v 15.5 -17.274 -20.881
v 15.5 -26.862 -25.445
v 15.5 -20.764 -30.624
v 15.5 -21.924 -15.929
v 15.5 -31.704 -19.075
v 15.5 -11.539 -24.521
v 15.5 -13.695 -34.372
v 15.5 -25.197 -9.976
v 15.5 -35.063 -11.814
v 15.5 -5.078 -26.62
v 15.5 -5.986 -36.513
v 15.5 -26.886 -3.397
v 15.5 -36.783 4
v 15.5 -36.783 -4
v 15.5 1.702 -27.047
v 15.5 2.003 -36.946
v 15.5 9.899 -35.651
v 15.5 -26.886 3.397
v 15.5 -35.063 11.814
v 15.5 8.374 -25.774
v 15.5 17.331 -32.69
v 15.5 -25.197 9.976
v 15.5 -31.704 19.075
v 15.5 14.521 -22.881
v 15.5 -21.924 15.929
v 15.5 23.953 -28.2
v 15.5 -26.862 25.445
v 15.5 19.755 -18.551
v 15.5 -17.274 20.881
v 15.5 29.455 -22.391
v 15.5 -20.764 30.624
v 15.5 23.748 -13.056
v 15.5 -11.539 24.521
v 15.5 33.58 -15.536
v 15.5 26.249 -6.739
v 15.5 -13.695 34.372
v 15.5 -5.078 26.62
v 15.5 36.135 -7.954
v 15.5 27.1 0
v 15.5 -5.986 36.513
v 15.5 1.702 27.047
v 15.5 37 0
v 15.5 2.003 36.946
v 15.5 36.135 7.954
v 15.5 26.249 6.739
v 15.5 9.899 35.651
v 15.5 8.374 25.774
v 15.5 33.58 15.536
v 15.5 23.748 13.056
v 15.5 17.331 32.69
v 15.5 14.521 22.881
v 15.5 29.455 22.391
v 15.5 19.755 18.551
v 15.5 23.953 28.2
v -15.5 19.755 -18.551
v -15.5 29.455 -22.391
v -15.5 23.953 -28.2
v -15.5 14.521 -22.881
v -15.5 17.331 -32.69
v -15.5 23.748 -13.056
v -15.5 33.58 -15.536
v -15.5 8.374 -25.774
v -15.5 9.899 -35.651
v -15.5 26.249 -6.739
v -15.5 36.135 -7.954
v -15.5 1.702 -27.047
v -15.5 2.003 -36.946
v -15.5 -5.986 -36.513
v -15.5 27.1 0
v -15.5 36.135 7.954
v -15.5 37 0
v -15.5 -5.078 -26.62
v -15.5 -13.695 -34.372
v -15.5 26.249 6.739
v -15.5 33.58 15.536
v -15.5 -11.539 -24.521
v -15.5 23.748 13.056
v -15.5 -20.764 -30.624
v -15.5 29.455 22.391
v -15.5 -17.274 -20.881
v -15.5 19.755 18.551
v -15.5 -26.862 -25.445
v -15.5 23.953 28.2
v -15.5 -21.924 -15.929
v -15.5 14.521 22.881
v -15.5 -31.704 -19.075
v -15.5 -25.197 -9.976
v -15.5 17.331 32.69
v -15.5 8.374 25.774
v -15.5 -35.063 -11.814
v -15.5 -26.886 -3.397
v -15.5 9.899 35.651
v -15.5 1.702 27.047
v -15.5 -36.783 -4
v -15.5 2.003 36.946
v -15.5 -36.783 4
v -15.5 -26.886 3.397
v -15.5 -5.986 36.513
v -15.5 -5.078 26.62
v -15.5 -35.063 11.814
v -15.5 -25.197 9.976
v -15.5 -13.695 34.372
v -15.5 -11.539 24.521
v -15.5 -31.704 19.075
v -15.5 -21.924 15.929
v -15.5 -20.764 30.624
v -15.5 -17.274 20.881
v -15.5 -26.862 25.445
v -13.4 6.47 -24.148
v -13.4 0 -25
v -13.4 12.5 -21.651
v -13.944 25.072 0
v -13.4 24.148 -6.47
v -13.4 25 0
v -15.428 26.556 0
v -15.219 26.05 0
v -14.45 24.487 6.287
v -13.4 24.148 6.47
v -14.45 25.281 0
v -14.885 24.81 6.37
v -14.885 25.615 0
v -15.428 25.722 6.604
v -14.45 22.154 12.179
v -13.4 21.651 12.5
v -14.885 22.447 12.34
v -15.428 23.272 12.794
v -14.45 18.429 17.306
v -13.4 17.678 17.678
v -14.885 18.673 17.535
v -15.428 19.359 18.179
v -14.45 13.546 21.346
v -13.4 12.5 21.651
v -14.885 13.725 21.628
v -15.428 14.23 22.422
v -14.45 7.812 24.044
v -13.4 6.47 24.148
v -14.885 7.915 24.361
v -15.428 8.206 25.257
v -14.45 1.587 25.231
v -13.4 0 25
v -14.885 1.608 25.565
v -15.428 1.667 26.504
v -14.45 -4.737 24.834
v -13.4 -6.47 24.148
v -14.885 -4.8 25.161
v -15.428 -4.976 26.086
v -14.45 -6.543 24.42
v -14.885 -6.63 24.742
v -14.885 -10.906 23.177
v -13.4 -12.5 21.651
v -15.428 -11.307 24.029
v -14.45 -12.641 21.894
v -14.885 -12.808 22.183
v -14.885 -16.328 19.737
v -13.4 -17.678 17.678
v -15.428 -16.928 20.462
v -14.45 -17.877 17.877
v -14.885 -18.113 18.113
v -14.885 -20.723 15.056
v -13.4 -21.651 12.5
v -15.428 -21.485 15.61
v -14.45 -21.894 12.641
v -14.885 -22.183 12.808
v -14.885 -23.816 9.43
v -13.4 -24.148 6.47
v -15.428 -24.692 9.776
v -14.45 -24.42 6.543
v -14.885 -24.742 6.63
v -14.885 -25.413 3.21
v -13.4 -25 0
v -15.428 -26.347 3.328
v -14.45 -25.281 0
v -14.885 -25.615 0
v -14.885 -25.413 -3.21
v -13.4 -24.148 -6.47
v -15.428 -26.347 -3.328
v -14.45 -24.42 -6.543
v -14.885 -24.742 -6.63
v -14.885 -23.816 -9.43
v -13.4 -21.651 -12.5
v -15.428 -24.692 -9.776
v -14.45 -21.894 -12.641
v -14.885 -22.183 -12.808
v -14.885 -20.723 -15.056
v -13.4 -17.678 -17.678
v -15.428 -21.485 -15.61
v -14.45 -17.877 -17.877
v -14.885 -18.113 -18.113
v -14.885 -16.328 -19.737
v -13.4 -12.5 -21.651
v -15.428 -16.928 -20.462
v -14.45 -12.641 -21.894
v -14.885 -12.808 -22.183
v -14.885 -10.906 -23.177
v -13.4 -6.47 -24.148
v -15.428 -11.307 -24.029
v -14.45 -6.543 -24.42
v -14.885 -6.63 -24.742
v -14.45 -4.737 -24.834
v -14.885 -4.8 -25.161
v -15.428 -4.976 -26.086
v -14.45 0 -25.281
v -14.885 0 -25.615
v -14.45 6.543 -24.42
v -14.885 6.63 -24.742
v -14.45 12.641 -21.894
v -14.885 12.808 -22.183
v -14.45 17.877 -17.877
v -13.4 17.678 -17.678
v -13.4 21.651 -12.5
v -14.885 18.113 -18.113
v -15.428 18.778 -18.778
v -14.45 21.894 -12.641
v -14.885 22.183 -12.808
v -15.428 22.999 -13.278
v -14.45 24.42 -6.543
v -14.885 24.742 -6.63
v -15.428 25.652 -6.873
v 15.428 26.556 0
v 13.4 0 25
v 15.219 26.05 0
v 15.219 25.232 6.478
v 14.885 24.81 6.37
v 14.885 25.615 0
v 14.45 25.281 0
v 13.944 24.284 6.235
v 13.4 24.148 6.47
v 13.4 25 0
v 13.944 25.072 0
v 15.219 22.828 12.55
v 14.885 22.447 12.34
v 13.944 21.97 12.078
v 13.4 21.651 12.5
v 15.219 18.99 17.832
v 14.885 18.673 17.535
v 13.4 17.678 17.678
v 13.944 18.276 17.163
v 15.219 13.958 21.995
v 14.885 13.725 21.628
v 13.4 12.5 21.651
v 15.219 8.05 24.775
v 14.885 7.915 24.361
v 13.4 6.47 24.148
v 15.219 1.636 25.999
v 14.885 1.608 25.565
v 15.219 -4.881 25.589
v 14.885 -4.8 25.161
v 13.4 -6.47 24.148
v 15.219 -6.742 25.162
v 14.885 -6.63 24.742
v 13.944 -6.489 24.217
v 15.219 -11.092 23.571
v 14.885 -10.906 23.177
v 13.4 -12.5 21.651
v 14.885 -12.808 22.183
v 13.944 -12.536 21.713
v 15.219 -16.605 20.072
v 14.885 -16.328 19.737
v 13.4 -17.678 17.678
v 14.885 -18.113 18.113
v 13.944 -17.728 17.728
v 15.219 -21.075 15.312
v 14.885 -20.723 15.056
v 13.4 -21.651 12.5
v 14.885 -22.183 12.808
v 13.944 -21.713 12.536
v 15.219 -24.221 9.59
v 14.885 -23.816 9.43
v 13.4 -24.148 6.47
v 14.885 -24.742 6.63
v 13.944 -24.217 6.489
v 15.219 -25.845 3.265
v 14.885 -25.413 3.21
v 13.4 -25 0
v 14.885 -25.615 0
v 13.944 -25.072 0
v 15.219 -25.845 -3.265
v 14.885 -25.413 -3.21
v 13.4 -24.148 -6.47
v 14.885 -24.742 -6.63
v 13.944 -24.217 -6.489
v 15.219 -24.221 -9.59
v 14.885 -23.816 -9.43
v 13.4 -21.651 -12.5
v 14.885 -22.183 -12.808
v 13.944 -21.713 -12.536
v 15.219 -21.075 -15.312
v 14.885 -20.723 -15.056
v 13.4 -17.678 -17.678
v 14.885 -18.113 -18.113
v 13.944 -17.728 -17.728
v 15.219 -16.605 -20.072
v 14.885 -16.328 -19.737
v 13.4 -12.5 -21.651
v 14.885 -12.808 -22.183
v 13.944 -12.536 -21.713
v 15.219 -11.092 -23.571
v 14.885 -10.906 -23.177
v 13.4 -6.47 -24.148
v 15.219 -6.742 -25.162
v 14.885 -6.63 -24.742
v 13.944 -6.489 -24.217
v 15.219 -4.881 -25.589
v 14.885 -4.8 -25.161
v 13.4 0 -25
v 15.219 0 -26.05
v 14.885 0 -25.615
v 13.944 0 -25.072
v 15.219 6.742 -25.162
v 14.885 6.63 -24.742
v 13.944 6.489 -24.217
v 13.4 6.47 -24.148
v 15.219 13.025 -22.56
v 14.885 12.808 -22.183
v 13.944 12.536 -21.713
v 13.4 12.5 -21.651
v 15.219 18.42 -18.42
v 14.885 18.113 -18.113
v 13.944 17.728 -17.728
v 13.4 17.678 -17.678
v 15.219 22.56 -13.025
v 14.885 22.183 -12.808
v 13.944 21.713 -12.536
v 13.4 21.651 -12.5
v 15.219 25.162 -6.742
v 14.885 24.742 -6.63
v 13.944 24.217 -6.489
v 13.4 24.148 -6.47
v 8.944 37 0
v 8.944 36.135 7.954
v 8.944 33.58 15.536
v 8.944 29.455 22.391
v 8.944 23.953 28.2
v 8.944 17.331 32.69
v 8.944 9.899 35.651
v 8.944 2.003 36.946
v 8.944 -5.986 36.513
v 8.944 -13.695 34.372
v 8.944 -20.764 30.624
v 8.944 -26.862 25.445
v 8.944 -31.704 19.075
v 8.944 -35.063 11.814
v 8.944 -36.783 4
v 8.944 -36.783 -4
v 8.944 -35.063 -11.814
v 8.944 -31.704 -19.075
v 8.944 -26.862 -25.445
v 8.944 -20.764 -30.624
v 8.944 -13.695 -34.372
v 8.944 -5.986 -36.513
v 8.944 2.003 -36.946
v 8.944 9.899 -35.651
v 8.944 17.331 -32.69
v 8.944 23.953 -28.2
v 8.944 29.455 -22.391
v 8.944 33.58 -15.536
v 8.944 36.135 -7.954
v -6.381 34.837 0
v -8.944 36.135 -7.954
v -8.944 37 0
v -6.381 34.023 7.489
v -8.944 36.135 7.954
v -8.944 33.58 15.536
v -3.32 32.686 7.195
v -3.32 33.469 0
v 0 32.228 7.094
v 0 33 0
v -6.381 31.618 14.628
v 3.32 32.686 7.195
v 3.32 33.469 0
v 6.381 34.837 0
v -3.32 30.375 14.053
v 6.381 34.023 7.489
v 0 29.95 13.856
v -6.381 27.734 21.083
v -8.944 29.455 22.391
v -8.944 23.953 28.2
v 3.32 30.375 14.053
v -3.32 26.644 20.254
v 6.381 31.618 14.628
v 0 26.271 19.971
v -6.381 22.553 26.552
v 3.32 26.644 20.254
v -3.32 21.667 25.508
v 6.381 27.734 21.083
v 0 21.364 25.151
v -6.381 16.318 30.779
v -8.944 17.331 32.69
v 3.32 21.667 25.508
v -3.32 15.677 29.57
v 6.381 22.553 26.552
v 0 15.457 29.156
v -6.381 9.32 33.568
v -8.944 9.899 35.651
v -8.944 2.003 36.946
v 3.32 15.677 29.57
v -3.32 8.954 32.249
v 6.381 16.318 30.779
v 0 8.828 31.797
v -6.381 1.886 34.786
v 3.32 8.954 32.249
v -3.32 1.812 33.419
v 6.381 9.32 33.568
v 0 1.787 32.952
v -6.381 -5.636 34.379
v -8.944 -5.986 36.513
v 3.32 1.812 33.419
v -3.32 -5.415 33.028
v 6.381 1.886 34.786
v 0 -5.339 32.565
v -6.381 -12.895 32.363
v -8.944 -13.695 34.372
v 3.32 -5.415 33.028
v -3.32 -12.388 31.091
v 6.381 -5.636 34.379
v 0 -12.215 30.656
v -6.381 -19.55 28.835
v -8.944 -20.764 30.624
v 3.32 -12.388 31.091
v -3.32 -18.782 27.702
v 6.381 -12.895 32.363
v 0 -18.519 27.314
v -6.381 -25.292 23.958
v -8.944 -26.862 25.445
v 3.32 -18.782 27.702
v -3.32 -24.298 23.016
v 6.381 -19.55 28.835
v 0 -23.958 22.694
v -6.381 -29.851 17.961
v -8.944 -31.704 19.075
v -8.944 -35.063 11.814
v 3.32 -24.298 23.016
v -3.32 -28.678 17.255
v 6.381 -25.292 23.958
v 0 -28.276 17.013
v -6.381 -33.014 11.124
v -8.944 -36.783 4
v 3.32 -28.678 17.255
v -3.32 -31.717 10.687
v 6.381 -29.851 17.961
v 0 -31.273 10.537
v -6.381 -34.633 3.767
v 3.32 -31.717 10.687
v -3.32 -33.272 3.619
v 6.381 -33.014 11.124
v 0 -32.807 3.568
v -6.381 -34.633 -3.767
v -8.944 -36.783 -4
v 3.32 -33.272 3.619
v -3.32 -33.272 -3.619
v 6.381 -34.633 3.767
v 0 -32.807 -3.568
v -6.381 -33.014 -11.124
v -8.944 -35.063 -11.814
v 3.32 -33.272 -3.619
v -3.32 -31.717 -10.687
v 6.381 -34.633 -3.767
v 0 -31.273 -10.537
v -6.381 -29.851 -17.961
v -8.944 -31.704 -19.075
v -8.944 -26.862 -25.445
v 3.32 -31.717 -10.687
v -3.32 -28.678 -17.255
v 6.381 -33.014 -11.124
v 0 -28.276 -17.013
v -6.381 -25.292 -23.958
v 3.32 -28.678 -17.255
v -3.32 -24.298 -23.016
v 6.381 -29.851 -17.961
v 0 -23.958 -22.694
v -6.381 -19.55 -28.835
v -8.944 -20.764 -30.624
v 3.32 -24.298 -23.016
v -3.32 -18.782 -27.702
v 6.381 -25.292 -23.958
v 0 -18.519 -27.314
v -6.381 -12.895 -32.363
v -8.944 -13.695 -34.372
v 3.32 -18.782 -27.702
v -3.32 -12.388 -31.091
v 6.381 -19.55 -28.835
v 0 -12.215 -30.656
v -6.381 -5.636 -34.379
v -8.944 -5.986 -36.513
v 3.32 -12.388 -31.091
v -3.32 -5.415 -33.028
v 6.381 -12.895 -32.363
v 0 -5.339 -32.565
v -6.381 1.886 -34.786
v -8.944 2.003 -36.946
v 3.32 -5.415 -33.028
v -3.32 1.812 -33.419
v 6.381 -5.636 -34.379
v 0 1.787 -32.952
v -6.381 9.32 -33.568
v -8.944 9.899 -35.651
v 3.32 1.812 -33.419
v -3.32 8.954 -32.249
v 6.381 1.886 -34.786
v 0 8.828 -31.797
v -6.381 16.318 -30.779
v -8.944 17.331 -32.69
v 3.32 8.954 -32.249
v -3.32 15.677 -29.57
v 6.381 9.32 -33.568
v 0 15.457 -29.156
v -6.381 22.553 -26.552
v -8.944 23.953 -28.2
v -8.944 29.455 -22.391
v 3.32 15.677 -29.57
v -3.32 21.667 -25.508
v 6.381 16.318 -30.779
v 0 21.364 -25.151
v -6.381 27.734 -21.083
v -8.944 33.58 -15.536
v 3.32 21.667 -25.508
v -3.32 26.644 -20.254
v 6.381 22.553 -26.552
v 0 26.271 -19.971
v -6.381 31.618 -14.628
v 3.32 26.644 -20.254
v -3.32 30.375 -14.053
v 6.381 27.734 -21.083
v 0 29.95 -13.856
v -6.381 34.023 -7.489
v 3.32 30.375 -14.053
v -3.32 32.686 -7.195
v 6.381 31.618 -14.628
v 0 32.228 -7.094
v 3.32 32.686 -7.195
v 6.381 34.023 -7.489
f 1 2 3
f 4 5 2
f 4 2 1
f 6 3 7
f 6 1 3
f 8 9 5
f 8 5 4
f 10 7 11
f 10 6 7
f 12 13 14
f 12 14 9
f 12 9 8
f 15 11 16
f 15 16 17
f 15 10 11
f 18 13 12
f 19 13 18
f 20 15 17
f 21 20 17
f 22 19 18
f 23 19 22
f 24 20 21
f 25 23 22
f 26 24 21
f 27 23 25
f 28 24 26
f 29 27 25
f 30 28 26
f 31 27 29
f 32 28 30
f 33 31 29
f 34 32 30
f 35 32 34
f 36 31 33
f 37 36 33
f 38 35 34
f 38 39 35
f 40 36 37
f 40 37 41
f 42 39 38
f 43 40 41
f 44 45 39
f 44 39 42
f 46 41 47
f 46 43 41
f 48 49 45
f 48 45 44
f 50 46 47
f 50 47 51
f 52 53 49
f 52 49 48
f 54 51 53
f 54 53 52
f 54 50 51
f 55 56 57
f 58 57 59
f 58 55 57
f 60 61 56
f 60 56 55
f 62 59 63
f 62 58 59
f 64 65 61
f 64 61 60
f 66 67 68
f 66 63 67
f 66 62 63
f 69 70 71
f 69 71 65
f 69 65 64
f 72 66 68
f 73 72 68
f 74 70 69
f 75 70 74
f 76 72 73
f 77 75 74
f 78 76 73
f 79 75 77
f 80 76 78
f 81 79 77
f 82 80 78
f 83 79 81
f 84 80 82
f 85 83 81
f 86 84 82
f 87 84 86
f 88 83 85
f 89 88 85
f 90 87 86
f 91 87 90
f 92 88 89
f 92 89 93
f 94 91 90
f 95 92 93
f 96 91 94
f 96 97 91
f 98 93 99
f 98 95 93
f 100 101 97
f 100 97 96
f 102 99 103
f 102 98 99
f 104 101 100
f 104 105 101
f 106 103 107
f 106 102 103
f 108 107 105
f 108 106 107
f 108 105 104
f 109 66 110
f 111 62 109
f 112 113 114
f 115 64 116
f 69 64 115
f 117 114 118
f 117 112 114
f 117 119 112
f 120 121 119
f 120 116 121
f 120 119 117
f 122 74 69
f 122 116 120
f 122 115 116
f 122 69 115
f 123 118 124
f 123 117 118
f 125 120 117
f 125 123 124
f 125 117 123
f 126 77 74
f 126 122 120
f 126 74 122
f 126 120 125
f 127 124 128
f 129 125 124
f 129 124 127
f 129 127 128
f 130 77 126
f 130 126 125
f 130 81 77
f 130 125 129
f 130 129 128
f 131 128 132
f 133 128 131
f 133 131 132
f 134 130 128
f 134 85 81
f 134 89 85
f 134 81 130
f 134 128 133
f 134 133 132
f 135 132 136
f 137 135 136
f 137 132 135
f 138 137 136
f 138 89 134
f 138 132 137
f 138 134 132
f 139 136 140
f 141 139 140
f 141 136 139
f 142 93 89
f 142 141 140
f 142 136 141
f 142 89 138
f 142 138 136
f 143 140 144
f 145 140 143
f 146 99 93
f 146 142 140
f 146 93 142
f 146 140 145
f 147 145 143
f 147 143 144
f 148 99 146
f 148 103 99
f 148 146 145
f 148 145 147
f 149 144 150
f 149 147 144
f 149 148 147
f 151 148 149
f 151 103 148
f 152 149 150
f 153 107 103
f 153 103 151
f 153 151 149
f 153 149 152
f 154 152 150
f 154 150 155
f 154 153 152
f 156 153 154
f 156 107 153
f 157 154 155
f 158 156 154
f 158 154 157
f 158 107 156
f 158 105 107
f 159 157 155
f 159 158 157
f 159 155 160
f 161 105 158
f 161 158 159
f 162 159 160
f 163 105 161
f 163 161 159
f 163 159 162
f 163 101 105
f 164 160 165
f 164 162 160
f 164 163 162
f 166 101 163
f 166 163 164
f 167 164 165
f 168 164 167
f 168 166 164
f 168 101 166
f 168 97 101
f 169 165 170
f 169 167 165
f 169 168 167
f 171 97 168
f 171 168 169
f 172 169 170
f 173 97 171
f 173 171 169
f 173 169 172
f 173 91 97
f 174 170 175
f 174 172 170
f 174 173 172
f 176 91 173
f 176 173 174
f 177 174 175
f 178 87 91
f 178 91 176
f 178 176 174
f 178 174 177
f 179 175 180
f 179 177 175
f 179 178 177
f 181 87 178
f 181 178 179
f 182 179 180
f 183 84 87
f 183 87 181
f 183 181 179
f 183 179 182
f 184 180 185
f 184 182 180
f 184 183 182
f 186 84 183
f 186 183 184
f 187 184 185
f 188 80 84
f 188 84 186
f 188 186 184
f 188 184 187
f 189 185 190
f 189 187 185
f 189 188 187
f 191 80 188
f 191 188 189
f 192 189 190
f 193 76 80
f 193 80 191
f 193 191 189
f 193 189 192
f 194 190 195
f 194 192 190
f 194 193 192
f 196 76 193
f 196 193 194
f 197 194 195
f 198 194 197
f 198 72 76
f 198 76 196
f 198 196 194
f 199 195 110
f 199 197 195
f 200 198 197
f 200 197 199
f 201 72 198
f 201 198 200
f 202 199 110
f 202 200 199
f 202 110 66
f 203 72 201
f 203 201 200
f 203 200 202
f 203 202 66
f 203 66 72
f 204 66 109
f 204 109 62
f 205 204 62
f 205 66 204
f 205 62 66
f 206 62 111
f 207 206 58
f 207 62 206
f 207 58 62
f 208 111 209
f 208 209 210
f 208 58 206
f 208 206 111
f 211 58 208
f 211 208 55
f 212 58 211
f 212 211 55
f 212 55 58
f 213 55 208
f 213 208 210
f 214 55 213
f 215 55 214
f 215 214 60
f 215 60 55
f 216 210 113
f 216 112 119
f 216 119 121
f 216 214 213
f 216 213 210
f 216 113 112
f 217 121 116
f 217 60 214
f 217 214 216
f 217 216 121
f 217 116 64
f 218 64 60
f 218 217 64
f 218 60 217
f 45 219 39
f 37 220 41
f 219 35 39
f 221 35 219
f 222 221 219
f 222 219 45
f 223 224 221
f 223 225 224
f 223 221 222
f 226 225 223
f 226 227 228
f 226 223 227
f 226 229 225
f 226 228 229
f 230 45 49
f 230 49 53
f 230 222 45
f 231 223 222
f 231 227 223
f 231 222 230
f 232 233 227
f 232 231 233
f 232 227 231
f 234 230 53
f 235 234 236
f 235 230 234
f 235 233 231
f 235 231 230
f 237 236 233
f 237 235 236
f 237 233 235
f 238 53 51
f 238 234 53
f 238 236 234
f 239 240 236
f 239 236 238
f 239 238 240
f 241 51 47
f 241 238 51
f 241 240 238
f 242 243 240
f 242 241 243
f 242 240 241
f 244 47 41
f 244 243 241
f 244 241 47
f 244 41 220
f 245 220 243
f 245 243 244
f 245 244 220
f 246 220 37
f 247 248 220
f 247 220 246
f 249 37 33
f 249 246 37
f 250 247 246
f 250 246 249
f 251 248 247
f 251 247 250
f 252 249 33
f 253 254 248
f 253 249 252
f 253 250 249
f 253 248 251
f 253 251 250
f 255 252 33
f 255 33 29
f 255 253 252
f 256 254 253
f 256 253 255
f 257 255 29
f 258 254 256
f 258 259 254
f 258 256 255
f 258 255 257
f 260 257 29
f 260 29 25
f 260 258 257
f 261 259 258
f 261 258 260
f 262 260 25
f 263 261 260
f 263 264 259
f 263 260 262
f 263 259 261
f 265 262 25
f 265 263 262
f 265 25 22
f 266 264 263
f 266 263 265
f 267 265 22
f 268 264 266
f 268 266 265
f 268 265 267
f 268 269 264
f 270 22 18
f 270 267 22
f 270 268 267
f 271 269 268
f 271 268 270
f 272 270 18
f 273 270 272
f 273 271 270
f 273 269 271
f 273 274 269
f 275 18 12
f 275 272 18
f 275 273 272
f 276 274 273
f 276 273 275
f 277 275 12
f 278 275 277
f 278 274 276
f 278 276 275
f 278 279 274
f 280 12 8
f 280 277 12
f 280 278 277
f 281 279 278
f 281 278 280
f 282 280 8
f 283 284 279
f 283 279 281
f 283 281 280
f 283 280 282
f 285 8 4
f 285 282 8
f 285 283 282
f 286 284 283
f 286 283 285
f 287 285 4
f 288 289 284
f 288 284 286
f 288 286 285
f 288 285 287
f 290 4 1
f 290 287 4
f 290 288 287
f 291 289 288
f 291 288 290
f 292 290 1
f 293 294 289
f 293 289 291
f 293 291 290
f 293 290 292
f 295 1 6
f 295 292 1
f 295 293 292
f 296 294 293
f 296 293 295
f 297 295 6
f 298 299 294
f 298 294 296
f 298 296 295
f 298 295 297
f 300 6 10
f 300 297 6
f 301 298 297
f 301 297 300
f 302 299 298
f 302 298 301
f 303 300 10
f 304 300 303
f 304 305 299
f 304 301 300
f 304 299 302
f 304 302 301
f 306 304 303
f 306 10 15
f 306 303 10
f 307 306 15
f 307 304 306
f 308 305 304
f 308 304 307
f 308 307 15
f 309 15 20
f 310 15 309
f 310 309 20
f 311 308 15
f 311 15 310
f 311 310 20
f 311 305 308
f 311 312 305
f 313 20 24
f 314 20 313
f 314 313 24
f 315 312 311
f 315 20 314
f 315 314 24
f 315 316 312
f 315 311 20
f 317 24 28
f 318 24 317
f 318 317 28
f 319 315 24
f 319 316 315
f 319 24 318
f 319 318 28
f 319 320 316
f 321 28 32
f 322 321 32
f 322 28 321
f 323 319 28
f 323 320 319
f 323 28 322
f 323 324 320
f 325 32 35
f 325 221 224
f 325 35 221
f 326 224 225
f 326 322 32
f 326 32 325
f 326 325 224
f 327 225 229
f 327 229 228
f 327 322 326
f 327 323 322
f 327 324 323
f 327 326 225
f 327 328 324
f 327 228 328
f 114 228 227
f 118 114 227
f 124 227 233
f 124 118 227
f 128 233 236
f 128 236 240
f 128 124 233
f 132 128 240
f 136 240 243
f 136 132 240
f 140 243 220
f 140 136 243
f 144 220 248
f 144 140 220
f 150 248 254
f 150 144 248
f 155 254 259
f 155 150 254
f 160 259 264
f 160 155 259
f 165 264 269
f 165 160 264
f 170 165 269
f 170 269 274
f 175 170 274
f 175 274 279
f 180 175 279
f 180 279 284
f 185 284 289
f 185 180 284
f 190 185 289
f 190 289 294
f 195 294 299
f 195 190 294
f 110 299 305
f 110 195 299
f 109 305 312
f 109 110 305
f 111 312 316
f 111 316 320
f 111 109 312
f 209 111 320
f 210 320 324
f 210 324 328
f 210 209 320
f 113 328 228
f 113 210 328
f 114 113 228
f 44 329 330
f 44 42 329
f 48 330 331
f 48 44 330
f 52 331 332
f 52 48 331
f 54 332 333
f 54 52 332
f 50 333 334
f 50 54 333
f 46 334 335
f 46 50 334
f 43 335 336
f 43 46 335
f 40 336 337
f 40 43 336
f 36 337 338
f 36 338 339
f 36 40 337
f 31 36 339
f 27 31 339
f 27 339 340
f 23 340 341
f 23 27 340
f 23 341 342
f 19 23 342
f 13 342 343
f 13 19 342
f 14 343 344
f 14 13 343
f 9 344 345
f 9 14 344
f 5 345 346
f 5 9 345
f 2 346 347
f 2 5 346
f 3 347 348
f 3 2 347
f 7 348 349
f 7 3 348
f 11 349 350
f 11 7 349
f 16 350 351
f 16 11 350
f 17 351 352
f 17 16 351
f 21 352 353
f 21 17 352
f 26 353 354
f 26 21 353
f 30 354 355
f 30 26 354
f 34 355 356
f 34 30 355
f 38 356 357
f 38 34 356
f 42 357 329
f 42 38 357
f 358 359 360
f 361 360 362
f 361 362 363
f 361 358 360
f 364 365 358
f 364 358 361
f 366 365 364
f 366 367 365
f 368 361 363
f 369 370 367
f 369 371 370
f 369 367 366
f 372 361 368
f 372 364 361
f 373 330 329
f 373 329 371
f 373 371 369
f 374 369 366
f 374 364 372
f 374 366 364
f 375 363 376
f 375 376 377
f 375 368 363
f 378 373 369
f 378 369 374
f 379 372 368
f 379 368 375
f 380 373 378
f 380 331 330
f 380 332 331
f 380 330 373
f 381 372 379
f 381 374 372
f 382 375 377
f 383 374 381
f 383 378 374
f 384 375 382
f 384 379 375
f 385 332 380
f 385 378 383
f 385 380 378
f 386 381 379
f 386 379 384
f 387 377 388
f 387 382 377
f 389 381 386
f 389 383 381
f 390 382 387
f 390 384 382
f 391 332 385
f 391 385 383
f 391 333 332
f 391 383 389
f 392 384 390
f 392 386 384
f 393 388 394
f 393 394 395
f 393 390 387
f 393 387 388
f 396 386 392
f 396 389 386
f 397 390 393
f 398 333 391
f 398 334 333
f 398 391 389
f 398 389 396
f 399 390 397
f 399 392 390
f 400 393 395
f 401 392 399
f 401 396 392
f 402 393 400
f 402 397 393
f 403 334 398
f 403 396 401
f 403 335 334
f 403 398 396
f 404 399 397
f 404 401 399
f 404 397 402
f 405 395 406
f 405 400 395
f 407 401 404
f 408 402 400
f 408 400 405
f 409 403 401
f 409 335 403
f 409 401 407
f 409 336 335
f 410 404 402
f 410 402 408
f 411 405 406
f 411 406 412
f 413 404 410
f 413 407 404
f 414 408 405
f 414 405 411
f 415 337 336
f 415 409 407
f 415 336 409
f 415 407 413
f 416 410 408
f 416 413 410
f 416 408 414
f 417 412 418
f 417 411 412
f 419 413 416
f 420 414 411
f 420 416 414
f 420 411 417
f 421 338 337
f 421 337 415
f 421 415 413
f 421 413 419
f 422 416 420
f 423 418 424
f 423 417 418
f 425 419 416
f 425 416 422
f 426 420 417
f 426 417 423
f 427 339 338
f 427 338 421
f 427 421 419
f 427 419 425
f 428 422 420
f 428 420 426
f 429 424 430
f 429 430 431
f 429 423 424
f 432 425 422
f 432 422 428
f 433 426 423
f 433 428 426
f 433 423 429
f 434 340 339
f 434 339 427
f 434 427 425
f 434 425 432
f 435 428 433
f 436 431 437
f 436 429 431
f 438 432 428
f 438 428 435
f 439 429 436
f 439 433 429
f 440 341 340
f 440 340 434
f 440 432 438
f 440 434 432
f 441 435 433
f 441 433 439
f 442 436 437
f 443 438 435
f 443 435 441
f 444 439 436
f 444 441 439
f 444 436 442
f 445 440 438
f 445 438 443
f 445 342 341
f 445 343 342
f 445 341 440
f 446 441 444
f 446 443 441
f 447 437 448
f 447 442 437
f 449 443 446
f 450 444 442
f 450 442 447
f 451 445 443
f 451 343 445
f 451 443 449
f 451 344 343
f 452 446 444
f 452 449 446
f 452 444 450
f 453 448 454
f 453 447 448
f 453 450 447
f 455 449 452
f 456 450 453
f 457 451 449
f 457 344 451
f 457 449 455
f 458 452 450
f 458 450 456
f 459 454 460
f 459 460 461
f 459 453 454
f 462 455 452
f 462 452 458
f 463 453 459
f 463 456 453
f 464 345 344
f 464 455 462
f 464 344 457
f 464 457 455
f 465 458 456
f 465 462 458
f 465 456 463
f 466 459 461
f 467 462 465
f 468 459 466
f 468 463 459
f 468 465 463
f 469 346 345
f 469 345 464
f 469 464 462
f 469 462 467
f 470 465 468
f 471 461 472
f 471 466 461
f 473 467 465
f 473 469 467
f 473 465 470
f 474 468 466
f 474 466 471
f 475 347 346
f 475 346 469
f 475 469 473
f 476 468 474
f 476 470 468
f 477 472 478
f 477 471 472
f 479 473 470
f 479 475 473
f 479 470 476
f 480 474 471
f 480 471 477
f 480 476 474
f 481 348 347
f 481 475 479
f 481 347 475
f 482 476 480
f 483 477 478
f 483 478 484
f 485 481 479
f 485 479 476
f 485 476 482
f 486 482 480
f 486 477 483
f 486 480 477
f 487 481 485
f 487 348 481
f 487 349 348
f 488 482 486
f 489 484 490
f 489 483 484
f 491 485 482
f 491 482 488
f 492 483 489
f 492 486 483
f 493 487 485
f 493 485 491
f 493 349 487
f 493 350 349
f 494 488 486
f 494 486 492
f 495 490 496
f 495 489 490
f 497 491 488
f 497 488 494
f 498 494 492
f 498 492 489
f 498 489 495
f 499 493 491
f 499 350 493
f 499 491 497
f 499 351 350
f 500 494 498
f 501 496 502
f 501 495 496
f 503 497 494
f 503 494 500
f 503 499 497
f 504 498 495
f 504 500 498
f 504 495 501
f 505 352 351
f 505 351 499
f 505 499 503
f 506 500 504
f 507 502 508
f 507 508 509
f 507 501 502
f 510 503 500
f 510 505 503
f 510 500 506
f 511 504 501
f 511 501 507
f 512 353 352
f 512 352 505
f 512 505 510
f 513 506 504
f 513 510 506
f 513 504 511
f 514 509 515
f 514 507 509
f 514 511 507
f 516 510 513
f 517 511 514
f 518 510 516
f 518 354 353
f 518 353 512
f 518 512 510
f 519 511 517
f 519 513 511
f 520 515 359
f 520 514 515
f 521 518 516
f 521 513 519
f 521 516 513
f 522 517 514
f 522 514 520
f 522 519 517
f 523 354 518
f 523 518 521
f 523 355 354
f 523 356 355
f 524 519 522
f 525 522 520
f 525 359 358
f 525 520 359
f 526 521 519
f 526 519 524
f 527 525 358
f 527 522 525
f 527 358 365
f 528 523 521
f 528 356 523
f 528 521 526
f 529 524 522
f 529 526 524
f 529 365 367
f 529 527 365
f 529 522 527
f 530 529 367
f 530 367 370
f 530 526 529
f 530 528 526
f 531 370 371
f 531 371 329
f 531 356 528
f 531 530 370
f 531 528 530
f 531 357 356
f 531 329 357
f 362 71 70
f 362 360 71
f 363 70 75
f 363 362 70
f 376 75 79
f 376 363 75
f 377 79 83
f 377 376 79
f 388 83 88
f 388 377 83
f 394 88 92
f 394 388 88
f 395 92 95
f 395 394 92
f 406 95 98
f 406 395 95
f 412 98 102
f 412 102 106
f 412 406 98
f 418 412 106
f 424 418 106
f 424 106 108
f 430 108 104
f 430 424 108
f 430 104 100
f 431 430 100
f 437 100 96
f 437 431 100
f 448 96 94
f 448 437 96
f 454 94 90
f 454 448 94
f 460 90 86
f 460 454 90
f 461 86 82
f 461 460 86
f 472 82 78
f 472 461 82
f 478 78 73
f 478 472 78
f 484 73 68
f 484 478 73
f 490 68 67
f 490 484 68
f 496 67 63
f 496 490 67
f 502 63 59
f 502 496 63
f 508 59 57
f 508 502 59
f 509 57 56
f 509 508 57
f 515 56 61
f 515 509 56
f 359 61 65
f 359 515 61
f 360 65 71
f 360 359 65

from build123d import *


with BuildPart() as part:
    # Sketch1 → Revolve1 (revolve)
    with BuildSketch(Plane.XY):
        with BuildLine():
            Line((8.94427191, 37), (15.5, 37))
            Line((15.5, 37), (15.5, 27.1))
            ThreePointArc((15.5, 27.1), (14.88492424, 25.61507576), (13.4, 25))
            Line((13.4, 25), (-13.4, 25))
            ThreePointArc((-13.4, 25), (-14.88492424, 25.61507576), (-15.5, 27.1))
            Line((-15.5, 27.1), (-15.5, 37))
            Line((-15.5, 37), (-8.94427191, 37))
            ThreePointArc((-8.94427191, 37), (0, 33), (8.94427191, 37))
        make_face()
    revolve(axis=Axis((-44.328053157, 0, 0), (1, 0, 0)))


solid = part.part
